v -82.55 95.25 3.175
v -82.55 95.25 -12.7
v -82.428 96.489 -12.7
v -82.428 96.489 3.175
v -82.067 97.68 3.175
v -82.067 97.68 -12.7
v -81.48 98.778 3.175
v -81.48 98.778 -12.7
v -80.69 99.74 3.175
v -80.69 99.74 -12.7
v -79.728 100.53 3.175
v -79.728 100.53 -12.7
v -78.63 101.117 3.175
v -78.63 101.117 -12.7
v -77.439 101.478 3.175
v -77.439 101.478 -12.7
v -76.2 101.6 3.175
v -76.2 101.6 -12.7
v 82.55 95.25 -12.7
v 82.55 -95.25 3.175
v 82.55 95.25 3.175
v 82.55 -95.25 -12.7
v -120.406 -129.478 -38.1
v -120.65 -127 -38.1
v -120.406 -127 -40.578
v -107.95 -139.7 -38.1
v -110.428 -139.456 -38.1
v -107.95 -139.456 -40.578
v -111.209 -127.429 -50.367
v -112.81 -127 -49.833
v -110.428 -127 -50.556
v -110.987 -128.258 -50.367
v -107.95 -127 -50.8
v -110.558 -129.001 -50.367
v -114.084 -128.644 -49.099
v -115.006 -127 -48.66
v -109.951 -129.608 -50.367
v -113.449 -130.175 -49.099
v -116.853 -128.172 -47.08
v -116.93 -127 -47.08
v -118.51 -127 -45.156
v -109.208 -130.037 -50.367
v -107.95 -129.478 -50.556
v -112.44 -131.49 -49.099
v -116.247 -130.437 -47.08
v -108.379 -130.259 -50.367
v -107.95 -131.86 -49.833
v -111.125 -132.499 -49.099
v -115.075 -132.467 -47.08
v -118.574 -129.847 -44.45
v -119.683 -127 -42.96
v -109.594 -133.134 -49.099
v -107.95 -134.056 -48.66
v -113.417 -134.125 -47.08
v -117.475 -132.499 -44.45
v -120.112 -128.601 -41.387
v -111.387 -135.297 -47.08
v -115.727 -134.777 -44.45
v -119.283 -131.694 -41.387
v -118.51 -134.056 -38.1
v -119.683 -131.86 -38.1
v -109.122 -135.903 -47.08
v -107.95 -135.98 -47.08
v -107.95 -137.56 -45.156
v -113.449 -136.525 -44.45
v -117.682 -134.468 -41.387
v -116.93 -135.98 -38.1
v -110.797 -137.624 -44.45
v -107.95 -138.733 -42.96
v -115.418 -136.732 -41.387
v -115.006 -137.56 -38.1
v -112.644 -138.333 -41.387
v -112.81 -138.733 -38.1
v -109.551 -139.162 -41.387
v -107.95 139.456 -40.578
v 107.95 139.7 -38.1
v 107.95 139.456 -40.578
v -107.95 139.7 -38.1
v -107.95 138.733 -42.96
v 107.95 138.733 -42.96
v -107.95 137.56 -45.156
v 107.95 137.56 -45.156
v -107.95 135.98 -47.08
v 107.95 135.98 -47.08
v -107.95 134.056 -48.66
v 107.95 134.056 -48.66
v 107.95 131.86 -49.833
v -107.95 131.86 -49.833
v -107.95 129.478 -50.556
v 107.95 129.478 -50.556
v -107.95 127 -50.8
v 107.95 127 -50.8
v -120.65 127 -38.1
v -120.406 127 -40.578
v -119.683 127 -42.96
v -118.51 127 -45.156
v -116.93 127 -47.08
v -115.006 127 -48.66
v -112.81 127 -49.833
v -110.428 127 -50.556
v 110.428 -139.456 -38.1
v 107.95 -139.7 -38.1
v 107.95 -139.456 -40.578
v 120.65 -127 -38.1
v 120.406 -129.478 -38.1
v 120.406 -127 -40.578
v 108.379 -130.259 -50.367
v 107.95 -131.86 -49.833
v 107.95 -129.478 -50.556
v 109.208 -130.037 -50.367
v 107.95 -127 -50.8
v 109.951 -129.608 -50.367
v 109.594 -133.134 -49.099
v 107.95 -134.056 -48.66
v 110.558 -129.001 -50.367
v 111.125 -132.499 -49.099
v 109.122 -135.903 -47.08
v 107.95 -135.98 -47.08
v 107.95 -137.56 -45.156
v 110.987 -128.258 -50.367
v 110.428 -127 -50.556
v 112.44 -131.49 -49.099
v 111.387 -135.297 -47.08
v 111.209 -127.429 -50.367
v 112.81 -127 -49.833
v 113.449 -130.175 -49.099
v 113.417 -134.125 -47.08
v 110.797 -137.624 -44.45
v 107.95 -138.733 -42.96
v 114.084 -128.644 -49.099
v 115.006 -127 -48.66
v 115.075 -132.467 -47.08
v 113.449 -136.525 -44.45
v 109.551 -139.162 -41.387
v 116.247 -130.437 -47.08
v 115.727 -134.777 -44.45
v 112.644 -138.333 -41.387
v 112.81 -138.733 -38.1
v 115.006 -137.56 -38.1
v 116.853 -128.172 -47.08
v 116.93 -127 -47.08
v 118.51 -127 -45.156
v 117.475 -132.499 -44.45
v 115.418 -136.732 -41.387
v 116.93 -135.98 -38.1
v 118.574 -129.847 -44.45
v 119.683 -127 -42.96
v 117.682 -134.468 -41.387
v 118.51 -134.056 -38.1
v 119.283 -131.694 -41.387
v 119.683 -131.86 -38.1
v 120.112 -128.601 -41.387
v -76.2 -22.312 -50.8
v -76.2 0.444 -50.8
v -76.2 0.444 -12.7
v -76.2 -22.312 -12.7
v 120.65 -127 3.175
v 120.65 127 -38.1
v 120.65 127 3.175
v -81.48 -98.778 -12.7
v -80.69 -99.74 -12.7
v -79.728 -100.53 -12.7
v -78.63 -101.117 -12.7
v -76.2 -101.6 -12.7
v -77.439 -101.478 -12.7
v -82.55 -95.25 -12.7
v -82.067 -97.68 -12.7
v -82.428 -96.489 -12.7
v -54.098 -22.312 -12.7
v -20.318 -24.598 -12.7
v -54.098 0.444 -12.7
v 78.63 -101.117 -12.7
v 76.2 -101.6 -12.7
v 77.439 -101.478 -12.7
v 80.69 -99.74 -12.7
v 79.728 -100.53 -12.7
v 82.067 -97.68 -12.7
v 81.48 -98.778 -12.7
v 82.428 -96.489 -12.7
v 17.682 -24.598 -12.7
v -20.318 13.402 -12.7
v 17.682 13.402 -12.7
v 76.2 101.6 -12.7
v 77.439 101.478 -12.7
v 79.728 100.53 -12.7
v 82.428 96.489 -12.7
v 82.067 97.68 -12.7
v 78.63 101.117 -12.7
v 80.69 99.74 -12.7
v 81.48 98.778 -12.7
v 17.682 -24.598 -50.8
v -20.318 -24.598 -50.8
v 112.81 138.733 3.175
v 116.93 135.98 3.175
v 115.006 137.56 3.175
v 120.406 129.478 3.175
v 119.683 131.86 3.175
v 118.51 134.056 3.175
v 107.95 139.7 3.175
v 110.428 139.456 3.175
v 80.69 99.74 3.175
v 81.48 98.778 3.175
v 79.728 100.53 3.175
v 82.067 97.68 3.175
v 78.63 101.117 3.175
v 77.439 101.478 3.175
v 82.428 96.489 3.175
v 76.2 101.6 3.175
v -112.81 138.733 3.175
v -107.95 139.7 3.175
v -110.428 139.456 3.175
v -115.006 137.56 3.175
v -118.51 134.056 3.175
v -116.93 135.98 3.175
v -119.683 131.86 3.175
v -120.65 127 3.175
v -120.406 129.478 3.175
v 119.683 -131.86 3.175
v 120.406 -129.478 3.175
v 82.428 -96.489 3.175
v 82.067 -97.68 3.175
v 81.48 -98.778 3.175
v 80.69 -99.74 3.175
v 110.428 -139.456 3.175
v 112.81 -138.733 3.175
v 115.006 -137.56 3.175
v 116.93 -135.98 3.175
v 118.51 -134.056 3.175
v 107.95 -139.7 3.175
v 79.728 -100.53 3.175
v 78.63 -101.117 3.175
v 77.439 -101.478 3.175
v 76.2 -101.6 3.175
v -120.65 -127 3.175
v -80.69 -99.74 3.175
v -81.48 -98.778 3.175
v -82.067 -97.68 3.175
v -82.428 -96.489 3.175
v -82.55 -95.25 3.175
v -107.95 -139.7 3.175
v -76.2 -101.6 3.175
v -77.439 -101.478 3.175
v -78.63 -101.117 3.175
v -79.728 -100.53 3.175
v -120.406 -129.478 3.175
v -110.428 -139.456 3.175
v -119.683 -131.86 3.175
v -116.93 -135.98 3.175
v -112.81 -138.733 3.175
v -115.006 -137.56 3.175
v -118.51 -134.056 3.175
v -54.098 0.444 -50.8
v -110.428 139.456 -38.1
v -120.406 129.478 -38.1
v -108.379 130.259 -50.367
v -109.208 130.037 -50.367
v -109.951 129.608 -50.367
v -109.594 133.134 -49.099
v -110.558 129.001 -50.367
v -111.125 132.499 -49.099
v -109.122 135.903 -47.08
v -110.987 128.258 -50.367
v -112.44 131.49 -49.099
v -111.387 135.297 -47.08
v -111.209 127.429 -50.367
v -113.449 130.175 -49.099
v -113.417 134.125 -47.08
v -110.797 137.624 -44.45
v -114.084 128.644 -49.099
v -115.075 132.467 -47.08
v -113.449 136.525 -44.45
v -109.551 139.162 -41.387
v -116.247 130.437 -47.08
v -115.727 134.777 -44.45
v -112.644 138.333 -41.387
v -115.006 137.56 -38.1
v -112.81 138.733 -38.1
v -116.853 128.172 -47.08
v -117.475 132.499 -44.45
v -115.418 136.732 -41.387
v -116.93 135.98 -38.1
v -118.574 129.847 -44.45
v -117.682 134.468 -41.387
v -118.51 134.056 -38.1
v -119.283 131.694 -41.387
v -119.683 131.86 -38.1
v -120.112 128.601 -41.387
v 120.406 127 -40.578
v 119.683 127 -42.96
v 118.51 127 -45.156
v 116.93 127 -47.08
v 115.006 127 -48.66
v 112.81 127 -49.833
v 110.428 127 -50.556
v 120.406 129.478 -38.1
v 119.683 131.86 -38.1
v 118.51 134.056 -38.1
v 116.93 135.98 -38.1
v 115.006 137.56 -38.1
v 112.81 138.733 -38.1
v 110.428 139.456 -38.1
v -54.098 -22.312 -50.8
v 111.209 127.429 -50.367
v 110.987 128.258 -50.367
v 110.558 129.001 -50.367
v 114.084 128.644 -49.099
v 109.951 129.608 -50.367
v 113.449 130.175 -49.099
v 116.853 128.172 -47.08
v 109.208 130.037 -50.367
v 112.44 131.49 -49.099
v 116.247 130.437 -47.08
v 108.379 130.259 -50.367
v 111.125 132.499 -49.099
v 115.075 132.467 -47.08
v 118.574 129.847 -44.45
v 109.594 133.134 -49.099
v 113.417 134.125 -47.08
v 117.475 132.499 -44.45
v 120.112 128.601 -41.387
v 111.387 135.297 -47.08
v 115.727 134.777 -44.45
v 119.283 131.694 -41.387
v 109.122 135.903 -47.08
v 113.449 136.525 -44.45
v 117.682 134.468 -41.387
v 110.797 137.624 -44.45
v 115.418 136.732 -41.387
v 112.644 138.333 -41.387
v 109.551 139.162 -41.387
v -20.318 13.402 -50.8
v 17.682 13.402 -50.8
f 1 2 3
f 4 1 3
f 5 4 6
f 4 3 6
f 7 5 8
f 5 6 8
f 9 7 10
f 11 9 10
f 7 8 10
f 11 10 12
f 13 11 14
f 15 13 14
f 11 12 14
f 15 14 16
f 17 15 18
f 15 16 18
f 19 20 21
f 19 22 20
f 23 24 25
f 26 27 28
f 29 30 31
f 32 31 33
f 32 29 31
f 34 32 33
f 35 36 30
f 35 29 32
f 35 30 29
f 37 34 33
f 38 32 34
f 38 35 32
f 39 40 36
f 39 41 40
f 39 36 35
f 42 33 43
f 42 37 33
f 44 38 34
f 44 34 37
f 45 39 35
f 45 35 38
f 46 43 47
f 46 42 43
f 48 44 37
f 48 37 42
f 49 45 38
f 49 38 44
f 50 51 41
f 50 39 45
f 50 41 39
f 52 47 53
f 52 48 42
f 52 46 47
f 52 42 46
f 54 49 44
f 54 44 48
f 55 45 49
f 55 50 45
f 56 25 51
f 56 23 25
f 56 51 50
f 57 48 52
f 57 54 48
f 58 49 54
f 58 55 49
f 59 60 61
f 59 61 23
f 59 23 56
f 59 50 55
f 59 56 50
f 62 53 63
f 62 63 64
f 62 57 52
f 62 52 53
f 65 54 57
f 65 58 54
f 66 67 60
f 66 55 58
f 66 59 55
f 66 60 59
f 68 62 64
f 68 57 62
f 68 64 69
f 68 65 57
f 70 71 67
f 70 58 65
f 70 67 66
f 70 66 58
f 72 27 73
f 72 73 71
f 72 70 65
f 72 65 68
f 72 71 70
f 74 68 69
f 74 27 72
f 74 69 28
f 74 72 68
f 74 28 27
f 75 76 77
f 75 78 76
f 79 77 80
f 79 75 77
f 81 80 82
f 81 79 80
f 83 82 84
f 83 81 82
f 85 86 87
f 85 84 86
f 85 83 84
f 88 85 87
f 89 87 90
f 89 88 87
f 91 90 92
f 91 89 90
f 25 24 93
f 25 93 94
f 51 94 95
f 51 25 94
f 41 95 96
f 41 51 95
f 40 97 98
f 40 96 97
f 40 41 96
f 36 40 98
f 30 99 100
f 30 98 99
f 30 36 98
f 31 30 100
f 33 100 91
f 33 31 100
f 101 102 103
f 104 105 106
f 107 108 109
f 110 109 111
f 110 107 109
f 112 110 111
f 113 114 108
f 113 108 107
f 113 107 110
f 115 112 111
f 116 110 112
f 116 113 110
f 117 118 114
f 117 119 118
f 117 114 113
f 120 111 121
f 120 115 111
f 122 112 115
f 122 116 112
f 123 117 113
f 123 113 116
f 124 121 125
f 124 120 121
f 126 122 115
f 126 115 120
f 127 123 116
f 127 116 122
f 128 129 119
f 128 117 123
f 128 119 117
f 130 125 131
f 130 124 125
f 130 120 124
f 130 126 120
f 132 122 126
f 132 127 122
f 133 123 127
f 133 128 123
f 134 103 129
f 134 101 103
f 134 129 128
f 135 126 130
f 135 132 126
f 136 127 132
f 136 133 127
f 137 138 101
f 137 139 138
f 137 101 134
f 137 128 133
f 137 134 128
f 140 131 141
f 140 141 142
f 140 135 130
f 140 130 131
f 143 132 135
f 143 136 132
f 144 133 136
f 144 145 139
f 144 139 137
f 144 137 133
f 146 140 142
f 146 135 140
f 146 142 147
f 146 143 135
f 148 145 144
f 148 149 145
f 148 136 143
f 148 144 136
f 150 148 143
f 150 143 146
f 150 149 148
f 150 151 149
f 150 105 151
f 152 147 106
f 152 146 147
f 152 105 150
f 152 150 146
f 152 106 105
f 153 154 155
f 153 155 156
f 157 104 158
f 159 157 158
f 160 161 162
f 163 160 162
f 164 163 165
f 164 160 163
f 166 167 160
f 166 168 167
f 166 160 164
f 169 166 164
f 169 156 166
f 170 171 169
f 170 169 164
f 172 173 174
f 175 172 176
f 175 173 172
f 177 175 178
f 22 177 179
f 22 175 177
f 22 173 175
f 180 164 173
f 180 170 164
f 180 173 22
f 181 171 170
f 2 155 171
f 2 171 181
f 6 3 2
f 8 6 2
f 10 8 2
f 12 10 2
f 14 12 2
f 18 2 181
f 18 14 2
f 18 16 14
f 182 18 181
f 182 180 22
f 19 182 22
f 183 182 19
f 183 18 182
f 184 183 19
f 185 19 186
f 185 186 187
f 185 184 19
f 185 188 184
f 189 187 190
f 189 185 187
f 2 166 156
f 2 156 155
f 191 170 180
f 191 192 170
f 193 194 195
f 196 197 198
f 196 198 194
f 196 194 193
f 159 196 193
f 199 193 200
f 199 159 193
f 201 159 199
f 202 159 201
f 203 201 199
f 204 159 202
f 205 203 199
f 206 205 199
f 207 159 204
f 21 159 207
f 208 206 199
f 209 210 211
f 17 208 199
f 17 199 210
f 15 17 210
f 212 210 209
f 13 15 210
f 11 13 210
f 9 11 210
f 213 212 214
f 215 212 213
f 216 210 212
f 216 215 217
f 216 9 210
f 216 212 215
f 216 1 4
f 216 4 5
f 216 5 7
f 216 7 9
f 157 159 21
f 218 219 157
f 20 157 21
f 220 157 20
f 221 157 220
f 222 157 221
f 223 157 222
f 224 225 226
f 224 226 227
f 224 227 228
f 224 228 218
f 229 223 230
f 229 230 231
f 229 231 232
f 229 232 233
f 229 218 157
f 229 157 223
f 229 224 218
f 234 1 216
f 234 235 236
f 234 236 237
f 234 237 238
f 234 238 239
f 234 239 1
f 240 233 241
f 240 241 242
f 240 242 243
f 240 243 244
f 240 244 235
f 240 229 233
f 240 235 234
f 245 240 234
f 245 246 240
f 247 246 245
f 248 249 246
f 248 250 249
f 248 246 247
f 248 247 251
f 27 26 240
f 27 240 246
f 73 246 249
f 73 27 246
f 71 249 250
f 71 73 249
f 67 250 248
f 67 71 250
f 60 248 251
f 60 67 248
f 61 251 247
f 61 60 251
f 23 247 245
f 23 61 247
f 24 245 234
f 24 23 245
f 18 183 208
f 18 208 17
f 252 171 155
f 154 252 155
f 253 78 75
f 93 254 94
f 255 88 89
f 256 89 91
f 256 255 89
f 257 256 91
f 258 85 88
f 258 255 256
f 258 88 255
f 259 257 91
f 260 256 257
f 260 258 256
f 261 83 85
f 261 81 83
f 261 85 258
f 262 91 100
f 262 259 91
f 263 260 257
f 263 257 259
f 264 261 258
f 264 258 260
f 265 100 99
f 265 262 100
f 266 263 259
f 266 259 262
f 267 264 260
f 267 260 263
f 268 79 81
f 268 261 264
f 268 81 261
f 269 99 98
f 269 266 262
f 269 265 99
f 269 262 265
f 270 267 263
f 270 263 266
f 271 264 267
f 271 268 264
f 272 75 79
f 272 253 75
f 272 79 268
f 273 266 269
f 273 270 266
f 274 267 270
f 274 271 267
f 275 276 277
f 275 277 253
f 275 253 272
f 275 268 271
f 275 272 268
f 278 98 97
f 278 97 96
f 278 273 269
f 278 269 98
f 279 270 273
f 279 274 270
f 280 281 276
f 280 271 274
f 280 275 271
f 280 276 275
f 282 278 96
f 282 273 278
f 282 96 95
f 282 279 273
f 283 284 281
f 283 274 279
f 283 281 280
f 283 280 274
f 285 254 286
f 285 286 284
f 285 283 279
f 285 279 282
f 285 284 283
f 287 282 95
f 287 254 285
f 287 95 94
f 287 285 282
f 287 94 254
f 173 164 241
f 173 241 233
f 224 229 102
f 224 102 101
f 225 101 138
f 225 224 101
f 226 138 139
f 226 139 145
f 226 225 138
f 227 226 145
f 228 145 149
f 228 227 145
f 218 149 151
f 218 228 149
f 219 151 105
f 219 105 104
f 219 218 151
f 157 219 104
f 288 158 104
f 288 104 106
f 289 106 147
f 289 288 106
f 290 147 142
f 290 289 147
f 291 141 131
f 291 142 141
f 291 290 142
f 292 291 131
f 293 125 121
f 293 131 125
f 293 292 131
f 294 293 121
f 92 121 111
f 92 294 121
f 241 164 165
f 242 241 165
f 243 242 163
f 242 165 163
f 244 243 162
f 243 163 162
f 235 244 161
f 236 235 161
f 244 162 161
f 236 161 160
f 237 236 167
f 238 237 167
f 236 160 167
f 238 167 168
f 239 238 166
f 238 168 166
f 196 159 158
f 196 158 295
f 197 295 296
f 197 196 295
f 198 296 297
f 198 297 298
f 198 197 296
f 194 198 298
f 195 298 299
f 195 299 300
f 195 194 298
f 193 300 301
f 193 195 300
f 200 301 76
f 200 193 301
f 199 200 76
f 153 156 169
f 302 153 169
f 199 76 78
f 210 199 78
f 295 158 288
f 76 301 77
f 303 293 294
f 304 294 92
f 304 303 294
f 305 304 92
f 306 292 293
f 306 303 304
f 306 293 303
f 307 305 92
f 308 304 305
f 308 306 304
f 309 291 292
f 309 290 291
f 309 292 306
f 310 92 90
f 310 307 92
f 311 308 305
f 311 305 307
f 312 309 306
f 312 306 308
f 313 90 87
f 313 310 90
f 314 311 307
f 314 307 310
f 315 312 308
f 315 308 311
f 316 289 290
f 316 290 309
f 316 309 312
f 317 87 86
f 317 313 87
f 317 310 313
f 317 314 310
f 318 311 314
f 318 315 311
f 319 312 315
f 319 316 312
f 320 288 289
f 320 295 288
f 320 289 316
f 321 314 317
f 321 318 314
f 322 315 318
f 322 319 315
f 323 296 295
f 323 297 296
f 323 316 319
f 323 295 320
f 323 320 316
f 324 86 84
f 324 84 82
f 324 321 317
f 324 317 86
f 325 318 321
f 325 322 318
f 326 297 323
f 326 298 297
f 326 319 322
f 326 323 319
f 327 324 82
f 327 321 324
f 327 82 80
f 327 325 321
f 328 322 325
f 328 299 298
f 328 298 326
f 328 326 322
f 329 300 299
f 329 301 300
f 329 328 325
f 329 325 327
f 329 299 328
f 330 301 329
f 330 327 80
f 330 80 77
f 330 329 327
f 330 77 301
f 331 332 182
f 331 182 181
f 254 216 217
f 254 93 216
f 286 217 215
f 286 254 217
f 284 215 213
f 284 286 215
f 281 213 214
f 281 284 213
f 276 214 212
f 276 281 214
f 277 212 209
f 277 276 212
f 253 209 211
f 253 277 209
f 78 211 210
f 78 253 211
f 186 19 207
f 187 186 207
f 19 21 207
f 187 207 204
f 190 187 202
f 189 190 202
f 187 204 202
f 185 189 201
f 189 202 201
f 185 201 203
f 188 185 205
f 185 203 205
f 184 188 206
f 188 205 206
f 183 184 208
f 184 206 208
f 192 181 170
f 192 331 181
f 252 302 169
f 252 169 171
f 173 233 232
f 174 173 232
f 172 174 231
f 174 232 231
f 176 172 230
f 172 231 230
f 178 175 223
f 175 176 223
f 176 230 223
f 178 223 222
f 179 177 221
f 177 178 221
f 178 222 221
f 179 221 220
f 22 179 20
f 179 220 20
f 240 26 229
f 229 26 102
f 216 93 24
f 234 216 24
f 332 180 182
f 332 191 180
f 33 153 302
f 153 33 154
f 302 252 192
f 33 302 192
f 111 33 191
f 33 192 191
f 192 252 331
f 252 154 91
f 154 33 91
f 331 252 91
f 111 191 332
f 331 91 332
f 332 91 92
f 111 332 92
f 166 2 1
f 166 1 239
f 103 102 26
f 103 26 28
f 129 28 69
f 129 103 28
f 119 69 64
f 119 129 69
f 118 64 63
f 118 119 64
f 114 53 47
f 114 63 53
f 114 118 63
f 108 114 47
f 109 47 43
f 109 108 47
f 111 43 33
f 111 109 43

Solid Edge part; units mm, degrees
sketch "Sketch1" plane through (0, 0, 0) normal (0, 0, 1) x (1, 0, 0)
  line L0 (-120.65, -139.7) -> (120.65, -139.7)
  line L1 (120.65, -139.7) -> (120.65, 139.7)
  line L2 (120.65, 139.7) -> (-120.65, 139.7)
  line L3 (-120.65, 139.7) -> (-120.65, -139.7)
extrude "Protrusion1" add sketch "Sketch1" along normal mid plane 101.6
sketch "Sketch2" plane through (0, -139.7, 0) normal (0, -1, 0) x (1, 0, 0)
  line L0 (-120.65, 50.8) -> (120.65, 50.8)
  line L1 (120.65, 50.8) -> (120.65, 3.175)
  line L2 (120.65, 3.175) -> (-120.65, 3.175)
  line L3 (-120.65, 3.175) -> (-120.65, 50.8)
extrude "Cutout1" cut sketch "Sketch2" against normal up to vertex (279.4 mm away)
shell "Thinwall_1" thickness 38.1 removed faces 1 at (82.8463, 90.3393, 3.175)
fillet "Round_1" radius 12.7 8 edges at (120.65, 139.7, -23.8125) (120.65, -139.7, -23.8125) (-120.65, -139.7, -23.8125) (-120.65, 139.7, -23.8125) (0, -139.7, -50.8) (-120.65, 0, -50.8) (120.65, 0, -50.8) (0, 139.7, -50.8)
fillet "Round_2" radius 6.35 4 edges at (-82.55, 101.6, -4.7625) (82.55, 101.6, -4.7625) (82.55, -101.6, -4.7625) (-82.55, -101.6, -4.7625)
sketch "Sketch3" plane through (0, 0, -50.8) normal (0, 0, -1) x (-1, 0, 0)
  line L0 (54.0978, 0.4438) -> (76.2, 0.4438)
  line L1 (76.2, 0.4438) -> (76.2, -22.3123)
  line L2 (76.2, -22.3123) -> (54.0978, -22.3123)
  line L3 (54.0978, -22.3123) -> (54.0978, 0.4438)
extrude "ExtrudedCutout_6" cut sketch "Sketch3" against normal blind 98.1987
sketch "Sketch4" plane through (0, 0, -50.8) normal (0, 0, -1) x (0, -1, 0)
  line L0 (24.5981, 20.3184) -> (24.5981, -17.6816)
  line L1 (24.5981, -17.6816) -> (-13.4019, -17.6816)
  line L2 (-13.4019, -17.6816) -> (-13.4019, 20.3184)
  line L3 (-13.4019, 20.3184) -> (24.5981, 20.3184)
extrude "ExtrudedCutout_7" cut sketch "Sketch4" against normal blind 83.9753
